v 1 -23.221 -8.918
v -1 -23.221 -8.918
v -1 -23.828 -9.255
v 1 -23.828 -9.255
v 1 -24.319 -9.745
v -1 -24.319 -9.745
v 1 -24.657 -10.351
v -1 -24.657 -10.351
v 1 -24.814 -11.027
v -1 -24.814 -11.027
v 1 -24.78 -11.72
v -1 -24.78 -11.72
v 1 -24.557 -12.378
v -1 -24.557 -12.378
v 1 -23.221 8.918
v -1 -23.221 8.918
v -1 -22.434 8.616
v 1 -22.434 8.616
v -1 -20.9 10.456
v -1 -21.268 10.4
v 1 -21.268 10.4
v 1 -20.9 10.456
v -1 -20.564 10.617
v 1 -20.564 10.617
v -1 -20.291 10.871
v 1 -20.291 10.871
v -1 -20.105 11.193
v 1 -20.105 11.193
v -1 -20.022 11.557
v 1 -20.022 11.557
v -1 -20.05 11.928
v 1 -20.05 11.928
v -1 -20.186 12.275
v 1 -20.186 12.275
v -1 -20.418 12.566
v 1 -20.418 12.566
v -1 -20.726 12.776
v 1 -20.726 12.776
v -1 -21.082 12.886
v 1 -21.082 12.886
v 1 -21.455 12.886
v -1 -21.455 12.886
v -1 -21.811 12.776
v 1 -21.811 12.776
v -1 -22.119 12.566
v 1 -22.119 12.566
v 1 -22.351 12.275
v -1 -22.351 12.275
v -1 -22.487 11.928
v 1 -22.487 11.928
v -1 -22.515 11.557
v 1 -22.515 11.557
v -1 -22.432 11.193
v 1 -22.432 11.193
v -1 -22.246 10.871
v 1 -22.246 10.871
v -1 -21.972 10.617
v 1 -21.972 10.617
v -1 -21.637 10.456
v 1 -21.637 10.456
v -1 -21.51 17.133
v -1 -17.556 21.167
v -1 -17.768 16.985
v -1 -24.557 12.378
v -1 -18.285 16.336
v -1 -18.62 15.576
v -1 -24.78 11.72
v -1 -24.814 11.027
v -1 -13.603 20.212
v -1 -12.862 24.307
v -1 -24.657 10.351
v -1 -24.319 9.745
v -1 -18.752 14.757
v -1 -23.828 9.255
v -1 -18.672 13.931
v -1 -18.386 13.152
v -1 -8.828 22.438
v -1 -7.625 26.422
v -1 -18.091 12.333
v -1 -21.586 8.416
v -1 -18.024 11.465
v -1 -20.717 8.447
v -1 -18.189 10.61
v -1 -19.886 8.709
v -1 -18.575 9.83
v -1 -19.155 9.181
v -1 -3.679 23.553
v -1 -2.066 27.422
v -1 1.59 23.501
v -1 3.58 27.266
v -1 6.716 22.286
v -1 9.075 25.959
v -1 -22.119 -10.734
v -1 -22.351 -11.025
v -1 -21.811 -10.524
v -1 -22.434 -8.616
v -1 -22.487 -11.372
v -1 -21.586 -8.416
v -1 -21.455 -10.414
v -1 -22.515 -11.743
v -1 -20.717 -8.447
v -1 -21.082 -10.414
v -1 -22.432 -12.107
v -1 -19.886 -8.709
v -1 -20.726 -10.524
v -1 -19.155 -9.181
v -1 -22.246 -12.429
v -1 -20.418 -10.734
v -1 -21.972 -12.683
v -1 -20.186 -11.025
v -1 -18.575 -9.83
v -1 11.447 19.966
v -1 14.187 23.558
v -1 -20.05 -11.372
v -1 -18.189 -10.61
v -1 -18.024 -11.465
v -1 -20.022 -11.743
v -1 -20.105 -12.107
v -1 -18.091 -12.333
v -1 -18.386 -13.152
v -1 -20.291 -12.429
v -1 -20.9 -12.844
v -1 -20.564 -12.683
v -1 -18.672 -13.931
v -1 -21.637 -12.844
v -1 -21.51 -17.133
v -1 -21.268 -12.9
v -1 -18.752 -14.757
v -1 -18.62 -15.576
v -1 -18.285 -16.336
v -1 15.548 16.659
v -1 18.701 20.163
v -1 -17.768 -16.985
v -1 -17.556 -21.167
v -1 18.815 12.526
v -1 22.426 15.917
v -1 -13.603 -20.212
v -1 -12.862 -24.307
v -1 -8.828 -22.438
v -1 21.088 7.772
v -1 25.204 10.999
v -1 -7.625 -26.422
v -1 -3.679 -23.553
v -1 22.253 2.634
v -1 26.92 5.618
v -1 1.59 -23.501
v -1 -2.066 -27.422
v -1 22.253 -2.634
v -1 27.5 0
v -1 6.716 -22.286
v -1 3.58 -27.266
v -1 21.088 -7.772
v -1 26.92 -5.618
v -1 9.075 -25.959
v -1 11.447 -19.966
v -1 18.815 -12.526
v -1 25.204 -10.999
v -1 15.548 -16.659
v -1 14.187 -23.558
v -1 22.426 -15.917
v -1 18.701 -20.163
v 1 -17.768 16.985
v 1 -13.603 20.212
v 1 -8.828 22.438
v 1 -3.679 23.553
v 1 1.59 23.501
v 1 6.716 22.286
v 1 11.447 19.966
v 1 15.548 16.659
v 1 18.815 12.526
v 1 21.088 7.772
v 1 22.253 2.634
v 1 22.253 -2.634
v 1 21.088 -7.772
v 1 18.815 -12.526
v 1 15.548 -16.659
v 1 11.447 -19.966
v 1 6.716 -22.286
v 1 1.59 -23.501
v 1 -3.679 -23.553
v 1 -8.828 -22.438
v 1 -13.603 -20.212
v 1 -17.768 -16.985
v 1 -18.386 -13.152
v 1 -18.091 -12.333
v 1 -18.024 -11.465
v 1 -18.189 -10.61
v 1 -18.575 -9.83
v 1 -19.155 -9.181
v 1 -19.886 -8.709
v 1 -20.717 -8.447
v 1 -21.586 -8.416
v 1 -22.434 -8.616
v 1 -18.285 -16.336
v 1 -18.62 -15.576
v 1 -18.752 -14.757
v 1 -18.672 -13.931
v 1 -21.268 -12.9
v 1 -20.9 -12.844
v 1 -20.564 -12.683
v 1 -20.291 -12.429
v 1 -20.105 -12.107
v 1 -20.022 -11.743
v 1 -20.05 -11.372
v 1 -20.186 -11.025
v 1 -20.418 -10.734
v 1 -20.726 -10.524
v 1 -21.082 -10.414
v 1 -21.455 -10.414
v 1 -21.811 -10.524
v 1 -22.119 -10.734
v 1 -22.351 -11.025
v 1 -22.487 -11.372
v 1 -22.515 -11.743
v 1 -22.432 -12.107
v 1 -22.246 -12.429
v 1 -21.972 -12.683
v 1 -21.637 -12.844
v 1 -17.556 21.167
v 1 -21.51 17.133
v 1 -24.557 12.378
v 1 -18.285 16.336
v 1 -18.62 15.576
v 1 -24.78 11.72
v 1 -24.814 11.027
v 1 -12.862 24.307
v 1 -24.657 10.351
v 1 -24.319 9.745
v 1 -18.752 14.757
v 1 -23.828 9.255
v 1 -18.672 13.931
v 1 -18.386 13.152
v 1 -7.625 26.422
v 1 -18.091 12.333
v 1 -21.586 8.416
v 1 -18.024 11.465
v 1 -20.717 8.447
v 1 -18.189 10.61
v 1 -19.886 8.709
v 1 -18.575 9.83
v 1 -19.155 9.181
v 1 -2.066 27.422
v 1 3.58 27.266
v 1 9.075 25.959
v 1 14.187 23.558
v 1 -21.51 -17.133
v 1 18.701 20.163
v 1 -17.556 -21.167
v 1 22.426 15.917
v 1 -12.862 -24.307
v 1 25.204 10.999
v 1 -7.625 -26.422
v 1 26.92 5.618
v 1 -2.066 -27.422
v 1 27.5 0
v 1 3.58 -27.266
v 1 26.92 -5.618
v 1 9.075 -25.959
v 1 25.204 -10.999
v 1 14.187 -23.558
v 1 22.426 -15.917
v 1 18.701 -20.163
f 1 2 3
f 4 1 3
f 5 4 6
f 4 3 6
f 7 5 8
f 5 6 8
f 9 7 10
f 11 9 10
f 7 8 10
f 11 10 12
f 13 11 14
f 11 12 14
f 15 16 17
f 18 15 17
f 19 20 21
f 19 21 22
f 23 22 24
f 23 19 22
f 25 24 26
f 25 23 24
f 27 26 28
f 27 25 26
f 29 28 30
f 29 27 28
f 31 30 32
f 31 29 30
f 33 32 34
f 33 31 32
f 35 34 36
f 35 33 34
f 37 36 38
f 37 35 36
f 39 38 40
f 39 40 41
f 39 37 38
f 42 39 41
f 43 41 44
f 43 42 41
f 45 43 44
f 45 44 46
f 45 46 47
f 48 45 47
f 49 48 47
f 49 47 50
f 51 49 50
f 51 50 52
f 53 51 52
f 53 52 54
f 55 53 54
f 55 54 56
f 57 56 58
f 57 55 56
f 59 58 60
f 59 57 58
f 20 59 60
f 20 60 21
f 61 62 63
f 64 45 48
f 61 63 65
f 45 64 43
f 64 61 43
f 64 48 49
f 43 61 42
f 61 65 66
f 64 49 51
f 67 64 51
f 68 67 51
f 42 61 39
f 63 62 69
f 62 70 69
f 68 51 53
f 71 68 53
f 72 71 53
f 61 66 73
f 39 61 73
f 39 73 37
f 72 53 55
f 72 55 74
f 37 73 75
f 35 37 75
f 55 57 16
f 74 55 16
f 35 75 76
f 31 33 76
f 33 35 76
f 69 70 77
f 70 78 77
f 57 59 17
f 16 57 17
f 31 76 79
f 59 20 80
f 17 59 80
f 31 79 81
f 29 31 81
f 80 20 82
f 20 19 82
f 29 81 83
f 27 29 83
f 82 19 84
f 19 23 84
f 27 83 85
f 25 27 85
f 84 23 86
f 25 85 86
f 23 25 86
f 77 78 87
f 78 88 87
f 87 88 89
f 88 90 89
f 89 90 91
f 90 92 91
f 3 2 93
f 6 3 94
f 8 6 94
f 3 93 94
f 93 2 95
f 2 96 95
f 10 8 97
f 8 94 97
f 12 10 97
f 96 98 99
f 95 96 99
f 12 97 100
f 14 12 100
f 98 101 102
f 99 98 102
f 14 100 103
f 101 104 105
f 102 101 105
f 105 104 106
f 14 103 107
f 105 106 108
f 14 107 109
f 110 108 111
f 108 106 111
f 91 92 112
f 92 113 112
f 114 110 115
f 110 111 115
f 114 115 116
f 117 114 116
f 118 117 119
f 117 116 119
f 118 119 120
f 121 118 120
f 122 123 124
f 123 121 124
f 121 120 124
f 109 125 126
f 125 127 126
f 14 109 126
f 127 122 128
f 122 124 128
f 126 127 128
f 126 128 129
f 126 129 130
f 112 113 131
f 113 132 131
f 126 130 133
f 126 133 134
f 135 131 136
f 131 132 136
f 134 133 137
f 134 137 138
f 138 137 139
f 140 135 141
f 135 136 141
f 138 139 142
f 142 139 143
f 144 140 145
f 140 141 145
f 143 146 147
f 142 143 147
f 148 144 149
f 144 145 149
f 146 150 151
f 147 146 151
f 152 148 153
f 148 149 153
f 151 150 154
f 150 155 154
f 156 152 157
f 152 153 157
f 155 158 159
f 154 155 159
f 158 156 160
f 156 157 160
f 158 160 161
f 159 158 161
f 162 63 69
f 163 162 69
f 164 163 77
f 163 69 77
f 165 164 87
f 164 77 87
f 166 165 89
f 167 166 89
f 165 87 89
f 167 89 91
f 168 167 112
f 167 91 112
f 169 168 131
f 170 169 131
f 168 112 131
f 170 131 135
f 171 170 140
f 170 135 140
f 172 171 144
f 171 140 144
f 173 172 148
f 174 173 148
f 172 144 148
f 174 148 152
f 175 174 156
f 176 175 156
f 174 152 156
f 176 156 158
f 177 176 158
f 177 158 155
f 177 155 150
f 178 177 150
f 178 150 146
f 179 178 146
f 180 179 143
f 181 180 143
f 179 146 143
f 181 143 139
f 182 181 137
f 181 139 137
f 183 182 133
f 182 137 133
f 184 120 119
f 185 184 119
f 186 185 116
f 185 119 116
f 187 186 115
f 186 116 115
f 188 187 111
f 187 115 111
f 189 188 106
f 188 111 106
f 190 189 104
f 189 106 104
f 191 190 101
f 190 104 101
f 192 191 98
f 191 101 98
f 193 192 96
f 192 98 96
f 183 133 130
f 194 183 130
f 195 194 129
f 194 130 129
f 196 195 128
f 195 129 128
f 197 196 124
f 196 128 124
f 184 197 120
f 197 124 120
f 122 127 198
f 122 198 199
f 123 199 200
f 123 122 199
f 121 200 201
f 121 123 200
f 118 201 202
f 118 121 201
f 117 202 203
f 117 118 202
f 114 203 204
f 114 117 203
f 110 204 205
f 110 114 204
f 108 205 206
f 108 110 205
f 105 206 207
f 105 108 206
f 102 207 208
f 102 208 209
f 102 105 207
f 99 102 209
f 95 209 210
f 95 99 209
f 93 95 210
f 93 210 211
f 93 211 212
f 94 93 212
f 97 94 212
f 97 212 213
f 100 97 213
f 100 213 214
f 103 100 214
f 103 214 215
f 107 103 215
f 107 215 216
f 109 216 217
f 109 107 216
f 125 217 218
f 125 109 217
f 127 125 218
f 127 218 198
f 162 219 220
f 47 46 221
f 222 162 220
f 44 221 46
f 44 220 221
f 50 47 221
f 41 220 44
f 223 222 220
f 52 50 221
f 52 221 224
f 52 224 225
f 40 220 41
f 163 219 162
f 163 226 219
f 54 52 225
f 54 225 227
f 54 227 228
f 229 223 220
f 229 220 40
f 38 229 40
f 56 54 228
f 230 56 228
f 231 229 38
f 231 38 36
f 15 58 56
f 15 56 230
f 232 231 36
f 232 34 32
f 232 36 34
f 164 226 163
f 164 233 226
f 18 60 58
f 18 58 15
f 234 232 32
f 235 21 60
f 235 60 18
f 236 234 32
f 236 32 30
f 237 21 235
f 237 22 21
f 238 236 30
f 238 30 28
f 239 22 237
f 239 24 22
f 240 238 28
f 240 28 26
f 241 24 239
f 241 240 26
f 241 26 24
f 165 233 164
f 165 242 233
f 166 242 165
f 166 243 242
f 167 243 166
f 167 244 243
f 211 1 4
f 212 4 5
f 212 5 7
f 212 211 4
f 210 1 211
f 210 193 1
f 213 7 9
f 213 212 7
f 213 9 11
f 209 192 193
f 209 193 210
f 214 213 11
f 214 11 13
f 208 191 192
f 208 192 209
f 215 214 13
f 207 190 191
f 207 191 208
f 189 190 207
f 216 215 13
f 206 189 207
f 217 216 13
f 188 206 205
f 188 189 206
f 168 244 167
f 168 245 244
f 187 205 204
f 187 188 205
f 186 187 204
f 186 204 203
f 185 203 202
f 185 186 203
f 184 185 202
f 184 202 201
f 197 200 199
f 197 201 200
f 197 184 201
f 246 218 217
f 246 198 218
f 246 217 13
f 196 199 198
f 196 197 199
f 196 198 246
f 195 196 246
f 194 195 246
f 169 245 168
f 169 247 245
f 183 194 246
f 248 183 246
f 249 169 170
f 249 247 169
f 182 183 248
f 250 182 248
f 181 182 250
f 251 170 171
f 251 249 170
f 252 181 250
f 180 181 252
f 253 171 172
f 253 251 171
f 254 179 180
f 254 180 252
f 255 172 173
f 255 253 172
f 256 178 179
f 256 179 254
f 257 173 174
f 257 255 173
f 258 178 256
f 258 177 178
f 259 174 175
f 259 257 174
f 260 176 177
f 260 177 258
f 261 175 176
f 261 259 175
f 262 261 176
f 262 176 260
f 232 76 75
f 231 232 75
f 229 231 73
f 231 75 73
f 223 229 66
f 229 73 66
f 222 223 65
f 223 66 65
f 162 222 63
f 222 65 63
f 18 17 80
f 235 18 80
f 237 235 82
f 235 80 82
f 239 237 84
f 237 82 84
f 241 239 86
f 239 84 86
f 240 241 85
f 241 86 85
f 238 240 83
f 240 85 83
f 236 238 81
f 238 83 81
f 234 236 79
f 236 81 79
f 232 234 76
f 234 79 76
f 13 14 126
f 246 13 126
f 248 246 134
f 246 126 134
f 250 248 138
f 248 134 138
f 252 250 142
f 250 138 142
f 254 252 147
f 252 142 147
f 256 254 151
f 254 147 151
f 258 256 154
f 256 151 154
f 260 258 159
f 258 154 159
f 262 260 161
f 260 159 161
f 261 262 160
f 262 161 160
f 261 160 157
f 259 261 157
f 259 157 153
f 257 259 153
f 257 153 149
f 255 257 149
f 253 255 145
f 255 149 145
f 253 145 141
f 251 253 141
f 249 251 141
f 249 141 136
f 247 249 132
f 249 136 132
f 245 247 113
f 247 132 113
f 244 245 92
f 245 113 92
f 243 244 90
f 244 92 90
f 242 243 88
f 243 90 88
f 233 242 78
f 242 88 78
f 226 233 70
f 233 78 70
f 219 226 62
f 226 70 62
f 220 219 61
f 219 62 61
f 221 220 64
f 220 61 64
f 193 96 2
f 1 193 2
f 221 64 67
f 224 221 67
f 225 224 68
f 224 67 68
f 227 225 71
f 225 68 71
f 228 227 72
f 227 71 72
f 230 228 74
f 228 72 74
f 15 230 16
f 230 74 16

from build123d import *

# Parameters (mm, degrees)
BOSS_EXTRUDE1_DEPTH      = 1
BOSS_EXTRUDE1_DEPTH_BACK = 1
SKETCH1_R                = 1.25


with BuildPart() as part:
    # Sketch1 → Boss-Extrude1 (new, two sides: drawn at the far end of the back side and taken through both)
    with BuildSketch(Plane(origin=(0, 0, 0), x_dir=(0, 0, -1), z_dir=(1, 0, 0)).offset(-BOSS_EXTRUDE1_DEPTH_BACK)):
        with BuildLine():
            Line((-8.918483886, -23.220909654), (-8.616074, -22.433530013))
            ThreePointArc((-8.616074, -22.433530013), (-9.486095569, -18.843411487), (-13.151705182, -18.38603339))
            ThreePointArc((-13.151705182, -18.38603339), (-15.170840028, -18.712326304), (-16.985042177, -17.767845941))
            ThreePointArc((-16.985042177, -17.767845941), (-1.98e-07, 22.4), (16.985042454, -17.767845656))
            ThreePointArc((16.985042454, -17.767845656), (15.170840224, -18.712326272), (13.151705182, -18.38603339))
            ThreePointArc((13.151705182, -18.38603339), (9.486095569, -18.843411487), (8.616074, -22.433530013))
            Line((8.616074, -22.433530013), (8.918483886, -23.220909654))
            ThreePointArc((8.918483886, -23.220909654), (10.351464338, -24.65663681), (12.377500601, -24.557025041))
            ThreePointArc((12.377500601, -24.557025041), (-9.7e-08, 27.5), (-12.377500429, -24.557025128))
            ThreePointArc((-12.377500429, -24.557025128), (-10.351464248, -24.656636775), (-8.918483886, -23.220909654))
        make_face()
        with Locations((11.65, -21.26828625)):
            Circle(SKETCH1_R, mode=Mode.SUBTRACT)
        with Locations((-11.65, -21.26828625)):
            Circle(SKETCH1_R, mode=Mode.SUBTRACT)
    extrude(amount=BOSS_EXTRUDE1_DEPTH + BOSS_EXTRUDE1_DEPTH_BACK)


solid = part.part
